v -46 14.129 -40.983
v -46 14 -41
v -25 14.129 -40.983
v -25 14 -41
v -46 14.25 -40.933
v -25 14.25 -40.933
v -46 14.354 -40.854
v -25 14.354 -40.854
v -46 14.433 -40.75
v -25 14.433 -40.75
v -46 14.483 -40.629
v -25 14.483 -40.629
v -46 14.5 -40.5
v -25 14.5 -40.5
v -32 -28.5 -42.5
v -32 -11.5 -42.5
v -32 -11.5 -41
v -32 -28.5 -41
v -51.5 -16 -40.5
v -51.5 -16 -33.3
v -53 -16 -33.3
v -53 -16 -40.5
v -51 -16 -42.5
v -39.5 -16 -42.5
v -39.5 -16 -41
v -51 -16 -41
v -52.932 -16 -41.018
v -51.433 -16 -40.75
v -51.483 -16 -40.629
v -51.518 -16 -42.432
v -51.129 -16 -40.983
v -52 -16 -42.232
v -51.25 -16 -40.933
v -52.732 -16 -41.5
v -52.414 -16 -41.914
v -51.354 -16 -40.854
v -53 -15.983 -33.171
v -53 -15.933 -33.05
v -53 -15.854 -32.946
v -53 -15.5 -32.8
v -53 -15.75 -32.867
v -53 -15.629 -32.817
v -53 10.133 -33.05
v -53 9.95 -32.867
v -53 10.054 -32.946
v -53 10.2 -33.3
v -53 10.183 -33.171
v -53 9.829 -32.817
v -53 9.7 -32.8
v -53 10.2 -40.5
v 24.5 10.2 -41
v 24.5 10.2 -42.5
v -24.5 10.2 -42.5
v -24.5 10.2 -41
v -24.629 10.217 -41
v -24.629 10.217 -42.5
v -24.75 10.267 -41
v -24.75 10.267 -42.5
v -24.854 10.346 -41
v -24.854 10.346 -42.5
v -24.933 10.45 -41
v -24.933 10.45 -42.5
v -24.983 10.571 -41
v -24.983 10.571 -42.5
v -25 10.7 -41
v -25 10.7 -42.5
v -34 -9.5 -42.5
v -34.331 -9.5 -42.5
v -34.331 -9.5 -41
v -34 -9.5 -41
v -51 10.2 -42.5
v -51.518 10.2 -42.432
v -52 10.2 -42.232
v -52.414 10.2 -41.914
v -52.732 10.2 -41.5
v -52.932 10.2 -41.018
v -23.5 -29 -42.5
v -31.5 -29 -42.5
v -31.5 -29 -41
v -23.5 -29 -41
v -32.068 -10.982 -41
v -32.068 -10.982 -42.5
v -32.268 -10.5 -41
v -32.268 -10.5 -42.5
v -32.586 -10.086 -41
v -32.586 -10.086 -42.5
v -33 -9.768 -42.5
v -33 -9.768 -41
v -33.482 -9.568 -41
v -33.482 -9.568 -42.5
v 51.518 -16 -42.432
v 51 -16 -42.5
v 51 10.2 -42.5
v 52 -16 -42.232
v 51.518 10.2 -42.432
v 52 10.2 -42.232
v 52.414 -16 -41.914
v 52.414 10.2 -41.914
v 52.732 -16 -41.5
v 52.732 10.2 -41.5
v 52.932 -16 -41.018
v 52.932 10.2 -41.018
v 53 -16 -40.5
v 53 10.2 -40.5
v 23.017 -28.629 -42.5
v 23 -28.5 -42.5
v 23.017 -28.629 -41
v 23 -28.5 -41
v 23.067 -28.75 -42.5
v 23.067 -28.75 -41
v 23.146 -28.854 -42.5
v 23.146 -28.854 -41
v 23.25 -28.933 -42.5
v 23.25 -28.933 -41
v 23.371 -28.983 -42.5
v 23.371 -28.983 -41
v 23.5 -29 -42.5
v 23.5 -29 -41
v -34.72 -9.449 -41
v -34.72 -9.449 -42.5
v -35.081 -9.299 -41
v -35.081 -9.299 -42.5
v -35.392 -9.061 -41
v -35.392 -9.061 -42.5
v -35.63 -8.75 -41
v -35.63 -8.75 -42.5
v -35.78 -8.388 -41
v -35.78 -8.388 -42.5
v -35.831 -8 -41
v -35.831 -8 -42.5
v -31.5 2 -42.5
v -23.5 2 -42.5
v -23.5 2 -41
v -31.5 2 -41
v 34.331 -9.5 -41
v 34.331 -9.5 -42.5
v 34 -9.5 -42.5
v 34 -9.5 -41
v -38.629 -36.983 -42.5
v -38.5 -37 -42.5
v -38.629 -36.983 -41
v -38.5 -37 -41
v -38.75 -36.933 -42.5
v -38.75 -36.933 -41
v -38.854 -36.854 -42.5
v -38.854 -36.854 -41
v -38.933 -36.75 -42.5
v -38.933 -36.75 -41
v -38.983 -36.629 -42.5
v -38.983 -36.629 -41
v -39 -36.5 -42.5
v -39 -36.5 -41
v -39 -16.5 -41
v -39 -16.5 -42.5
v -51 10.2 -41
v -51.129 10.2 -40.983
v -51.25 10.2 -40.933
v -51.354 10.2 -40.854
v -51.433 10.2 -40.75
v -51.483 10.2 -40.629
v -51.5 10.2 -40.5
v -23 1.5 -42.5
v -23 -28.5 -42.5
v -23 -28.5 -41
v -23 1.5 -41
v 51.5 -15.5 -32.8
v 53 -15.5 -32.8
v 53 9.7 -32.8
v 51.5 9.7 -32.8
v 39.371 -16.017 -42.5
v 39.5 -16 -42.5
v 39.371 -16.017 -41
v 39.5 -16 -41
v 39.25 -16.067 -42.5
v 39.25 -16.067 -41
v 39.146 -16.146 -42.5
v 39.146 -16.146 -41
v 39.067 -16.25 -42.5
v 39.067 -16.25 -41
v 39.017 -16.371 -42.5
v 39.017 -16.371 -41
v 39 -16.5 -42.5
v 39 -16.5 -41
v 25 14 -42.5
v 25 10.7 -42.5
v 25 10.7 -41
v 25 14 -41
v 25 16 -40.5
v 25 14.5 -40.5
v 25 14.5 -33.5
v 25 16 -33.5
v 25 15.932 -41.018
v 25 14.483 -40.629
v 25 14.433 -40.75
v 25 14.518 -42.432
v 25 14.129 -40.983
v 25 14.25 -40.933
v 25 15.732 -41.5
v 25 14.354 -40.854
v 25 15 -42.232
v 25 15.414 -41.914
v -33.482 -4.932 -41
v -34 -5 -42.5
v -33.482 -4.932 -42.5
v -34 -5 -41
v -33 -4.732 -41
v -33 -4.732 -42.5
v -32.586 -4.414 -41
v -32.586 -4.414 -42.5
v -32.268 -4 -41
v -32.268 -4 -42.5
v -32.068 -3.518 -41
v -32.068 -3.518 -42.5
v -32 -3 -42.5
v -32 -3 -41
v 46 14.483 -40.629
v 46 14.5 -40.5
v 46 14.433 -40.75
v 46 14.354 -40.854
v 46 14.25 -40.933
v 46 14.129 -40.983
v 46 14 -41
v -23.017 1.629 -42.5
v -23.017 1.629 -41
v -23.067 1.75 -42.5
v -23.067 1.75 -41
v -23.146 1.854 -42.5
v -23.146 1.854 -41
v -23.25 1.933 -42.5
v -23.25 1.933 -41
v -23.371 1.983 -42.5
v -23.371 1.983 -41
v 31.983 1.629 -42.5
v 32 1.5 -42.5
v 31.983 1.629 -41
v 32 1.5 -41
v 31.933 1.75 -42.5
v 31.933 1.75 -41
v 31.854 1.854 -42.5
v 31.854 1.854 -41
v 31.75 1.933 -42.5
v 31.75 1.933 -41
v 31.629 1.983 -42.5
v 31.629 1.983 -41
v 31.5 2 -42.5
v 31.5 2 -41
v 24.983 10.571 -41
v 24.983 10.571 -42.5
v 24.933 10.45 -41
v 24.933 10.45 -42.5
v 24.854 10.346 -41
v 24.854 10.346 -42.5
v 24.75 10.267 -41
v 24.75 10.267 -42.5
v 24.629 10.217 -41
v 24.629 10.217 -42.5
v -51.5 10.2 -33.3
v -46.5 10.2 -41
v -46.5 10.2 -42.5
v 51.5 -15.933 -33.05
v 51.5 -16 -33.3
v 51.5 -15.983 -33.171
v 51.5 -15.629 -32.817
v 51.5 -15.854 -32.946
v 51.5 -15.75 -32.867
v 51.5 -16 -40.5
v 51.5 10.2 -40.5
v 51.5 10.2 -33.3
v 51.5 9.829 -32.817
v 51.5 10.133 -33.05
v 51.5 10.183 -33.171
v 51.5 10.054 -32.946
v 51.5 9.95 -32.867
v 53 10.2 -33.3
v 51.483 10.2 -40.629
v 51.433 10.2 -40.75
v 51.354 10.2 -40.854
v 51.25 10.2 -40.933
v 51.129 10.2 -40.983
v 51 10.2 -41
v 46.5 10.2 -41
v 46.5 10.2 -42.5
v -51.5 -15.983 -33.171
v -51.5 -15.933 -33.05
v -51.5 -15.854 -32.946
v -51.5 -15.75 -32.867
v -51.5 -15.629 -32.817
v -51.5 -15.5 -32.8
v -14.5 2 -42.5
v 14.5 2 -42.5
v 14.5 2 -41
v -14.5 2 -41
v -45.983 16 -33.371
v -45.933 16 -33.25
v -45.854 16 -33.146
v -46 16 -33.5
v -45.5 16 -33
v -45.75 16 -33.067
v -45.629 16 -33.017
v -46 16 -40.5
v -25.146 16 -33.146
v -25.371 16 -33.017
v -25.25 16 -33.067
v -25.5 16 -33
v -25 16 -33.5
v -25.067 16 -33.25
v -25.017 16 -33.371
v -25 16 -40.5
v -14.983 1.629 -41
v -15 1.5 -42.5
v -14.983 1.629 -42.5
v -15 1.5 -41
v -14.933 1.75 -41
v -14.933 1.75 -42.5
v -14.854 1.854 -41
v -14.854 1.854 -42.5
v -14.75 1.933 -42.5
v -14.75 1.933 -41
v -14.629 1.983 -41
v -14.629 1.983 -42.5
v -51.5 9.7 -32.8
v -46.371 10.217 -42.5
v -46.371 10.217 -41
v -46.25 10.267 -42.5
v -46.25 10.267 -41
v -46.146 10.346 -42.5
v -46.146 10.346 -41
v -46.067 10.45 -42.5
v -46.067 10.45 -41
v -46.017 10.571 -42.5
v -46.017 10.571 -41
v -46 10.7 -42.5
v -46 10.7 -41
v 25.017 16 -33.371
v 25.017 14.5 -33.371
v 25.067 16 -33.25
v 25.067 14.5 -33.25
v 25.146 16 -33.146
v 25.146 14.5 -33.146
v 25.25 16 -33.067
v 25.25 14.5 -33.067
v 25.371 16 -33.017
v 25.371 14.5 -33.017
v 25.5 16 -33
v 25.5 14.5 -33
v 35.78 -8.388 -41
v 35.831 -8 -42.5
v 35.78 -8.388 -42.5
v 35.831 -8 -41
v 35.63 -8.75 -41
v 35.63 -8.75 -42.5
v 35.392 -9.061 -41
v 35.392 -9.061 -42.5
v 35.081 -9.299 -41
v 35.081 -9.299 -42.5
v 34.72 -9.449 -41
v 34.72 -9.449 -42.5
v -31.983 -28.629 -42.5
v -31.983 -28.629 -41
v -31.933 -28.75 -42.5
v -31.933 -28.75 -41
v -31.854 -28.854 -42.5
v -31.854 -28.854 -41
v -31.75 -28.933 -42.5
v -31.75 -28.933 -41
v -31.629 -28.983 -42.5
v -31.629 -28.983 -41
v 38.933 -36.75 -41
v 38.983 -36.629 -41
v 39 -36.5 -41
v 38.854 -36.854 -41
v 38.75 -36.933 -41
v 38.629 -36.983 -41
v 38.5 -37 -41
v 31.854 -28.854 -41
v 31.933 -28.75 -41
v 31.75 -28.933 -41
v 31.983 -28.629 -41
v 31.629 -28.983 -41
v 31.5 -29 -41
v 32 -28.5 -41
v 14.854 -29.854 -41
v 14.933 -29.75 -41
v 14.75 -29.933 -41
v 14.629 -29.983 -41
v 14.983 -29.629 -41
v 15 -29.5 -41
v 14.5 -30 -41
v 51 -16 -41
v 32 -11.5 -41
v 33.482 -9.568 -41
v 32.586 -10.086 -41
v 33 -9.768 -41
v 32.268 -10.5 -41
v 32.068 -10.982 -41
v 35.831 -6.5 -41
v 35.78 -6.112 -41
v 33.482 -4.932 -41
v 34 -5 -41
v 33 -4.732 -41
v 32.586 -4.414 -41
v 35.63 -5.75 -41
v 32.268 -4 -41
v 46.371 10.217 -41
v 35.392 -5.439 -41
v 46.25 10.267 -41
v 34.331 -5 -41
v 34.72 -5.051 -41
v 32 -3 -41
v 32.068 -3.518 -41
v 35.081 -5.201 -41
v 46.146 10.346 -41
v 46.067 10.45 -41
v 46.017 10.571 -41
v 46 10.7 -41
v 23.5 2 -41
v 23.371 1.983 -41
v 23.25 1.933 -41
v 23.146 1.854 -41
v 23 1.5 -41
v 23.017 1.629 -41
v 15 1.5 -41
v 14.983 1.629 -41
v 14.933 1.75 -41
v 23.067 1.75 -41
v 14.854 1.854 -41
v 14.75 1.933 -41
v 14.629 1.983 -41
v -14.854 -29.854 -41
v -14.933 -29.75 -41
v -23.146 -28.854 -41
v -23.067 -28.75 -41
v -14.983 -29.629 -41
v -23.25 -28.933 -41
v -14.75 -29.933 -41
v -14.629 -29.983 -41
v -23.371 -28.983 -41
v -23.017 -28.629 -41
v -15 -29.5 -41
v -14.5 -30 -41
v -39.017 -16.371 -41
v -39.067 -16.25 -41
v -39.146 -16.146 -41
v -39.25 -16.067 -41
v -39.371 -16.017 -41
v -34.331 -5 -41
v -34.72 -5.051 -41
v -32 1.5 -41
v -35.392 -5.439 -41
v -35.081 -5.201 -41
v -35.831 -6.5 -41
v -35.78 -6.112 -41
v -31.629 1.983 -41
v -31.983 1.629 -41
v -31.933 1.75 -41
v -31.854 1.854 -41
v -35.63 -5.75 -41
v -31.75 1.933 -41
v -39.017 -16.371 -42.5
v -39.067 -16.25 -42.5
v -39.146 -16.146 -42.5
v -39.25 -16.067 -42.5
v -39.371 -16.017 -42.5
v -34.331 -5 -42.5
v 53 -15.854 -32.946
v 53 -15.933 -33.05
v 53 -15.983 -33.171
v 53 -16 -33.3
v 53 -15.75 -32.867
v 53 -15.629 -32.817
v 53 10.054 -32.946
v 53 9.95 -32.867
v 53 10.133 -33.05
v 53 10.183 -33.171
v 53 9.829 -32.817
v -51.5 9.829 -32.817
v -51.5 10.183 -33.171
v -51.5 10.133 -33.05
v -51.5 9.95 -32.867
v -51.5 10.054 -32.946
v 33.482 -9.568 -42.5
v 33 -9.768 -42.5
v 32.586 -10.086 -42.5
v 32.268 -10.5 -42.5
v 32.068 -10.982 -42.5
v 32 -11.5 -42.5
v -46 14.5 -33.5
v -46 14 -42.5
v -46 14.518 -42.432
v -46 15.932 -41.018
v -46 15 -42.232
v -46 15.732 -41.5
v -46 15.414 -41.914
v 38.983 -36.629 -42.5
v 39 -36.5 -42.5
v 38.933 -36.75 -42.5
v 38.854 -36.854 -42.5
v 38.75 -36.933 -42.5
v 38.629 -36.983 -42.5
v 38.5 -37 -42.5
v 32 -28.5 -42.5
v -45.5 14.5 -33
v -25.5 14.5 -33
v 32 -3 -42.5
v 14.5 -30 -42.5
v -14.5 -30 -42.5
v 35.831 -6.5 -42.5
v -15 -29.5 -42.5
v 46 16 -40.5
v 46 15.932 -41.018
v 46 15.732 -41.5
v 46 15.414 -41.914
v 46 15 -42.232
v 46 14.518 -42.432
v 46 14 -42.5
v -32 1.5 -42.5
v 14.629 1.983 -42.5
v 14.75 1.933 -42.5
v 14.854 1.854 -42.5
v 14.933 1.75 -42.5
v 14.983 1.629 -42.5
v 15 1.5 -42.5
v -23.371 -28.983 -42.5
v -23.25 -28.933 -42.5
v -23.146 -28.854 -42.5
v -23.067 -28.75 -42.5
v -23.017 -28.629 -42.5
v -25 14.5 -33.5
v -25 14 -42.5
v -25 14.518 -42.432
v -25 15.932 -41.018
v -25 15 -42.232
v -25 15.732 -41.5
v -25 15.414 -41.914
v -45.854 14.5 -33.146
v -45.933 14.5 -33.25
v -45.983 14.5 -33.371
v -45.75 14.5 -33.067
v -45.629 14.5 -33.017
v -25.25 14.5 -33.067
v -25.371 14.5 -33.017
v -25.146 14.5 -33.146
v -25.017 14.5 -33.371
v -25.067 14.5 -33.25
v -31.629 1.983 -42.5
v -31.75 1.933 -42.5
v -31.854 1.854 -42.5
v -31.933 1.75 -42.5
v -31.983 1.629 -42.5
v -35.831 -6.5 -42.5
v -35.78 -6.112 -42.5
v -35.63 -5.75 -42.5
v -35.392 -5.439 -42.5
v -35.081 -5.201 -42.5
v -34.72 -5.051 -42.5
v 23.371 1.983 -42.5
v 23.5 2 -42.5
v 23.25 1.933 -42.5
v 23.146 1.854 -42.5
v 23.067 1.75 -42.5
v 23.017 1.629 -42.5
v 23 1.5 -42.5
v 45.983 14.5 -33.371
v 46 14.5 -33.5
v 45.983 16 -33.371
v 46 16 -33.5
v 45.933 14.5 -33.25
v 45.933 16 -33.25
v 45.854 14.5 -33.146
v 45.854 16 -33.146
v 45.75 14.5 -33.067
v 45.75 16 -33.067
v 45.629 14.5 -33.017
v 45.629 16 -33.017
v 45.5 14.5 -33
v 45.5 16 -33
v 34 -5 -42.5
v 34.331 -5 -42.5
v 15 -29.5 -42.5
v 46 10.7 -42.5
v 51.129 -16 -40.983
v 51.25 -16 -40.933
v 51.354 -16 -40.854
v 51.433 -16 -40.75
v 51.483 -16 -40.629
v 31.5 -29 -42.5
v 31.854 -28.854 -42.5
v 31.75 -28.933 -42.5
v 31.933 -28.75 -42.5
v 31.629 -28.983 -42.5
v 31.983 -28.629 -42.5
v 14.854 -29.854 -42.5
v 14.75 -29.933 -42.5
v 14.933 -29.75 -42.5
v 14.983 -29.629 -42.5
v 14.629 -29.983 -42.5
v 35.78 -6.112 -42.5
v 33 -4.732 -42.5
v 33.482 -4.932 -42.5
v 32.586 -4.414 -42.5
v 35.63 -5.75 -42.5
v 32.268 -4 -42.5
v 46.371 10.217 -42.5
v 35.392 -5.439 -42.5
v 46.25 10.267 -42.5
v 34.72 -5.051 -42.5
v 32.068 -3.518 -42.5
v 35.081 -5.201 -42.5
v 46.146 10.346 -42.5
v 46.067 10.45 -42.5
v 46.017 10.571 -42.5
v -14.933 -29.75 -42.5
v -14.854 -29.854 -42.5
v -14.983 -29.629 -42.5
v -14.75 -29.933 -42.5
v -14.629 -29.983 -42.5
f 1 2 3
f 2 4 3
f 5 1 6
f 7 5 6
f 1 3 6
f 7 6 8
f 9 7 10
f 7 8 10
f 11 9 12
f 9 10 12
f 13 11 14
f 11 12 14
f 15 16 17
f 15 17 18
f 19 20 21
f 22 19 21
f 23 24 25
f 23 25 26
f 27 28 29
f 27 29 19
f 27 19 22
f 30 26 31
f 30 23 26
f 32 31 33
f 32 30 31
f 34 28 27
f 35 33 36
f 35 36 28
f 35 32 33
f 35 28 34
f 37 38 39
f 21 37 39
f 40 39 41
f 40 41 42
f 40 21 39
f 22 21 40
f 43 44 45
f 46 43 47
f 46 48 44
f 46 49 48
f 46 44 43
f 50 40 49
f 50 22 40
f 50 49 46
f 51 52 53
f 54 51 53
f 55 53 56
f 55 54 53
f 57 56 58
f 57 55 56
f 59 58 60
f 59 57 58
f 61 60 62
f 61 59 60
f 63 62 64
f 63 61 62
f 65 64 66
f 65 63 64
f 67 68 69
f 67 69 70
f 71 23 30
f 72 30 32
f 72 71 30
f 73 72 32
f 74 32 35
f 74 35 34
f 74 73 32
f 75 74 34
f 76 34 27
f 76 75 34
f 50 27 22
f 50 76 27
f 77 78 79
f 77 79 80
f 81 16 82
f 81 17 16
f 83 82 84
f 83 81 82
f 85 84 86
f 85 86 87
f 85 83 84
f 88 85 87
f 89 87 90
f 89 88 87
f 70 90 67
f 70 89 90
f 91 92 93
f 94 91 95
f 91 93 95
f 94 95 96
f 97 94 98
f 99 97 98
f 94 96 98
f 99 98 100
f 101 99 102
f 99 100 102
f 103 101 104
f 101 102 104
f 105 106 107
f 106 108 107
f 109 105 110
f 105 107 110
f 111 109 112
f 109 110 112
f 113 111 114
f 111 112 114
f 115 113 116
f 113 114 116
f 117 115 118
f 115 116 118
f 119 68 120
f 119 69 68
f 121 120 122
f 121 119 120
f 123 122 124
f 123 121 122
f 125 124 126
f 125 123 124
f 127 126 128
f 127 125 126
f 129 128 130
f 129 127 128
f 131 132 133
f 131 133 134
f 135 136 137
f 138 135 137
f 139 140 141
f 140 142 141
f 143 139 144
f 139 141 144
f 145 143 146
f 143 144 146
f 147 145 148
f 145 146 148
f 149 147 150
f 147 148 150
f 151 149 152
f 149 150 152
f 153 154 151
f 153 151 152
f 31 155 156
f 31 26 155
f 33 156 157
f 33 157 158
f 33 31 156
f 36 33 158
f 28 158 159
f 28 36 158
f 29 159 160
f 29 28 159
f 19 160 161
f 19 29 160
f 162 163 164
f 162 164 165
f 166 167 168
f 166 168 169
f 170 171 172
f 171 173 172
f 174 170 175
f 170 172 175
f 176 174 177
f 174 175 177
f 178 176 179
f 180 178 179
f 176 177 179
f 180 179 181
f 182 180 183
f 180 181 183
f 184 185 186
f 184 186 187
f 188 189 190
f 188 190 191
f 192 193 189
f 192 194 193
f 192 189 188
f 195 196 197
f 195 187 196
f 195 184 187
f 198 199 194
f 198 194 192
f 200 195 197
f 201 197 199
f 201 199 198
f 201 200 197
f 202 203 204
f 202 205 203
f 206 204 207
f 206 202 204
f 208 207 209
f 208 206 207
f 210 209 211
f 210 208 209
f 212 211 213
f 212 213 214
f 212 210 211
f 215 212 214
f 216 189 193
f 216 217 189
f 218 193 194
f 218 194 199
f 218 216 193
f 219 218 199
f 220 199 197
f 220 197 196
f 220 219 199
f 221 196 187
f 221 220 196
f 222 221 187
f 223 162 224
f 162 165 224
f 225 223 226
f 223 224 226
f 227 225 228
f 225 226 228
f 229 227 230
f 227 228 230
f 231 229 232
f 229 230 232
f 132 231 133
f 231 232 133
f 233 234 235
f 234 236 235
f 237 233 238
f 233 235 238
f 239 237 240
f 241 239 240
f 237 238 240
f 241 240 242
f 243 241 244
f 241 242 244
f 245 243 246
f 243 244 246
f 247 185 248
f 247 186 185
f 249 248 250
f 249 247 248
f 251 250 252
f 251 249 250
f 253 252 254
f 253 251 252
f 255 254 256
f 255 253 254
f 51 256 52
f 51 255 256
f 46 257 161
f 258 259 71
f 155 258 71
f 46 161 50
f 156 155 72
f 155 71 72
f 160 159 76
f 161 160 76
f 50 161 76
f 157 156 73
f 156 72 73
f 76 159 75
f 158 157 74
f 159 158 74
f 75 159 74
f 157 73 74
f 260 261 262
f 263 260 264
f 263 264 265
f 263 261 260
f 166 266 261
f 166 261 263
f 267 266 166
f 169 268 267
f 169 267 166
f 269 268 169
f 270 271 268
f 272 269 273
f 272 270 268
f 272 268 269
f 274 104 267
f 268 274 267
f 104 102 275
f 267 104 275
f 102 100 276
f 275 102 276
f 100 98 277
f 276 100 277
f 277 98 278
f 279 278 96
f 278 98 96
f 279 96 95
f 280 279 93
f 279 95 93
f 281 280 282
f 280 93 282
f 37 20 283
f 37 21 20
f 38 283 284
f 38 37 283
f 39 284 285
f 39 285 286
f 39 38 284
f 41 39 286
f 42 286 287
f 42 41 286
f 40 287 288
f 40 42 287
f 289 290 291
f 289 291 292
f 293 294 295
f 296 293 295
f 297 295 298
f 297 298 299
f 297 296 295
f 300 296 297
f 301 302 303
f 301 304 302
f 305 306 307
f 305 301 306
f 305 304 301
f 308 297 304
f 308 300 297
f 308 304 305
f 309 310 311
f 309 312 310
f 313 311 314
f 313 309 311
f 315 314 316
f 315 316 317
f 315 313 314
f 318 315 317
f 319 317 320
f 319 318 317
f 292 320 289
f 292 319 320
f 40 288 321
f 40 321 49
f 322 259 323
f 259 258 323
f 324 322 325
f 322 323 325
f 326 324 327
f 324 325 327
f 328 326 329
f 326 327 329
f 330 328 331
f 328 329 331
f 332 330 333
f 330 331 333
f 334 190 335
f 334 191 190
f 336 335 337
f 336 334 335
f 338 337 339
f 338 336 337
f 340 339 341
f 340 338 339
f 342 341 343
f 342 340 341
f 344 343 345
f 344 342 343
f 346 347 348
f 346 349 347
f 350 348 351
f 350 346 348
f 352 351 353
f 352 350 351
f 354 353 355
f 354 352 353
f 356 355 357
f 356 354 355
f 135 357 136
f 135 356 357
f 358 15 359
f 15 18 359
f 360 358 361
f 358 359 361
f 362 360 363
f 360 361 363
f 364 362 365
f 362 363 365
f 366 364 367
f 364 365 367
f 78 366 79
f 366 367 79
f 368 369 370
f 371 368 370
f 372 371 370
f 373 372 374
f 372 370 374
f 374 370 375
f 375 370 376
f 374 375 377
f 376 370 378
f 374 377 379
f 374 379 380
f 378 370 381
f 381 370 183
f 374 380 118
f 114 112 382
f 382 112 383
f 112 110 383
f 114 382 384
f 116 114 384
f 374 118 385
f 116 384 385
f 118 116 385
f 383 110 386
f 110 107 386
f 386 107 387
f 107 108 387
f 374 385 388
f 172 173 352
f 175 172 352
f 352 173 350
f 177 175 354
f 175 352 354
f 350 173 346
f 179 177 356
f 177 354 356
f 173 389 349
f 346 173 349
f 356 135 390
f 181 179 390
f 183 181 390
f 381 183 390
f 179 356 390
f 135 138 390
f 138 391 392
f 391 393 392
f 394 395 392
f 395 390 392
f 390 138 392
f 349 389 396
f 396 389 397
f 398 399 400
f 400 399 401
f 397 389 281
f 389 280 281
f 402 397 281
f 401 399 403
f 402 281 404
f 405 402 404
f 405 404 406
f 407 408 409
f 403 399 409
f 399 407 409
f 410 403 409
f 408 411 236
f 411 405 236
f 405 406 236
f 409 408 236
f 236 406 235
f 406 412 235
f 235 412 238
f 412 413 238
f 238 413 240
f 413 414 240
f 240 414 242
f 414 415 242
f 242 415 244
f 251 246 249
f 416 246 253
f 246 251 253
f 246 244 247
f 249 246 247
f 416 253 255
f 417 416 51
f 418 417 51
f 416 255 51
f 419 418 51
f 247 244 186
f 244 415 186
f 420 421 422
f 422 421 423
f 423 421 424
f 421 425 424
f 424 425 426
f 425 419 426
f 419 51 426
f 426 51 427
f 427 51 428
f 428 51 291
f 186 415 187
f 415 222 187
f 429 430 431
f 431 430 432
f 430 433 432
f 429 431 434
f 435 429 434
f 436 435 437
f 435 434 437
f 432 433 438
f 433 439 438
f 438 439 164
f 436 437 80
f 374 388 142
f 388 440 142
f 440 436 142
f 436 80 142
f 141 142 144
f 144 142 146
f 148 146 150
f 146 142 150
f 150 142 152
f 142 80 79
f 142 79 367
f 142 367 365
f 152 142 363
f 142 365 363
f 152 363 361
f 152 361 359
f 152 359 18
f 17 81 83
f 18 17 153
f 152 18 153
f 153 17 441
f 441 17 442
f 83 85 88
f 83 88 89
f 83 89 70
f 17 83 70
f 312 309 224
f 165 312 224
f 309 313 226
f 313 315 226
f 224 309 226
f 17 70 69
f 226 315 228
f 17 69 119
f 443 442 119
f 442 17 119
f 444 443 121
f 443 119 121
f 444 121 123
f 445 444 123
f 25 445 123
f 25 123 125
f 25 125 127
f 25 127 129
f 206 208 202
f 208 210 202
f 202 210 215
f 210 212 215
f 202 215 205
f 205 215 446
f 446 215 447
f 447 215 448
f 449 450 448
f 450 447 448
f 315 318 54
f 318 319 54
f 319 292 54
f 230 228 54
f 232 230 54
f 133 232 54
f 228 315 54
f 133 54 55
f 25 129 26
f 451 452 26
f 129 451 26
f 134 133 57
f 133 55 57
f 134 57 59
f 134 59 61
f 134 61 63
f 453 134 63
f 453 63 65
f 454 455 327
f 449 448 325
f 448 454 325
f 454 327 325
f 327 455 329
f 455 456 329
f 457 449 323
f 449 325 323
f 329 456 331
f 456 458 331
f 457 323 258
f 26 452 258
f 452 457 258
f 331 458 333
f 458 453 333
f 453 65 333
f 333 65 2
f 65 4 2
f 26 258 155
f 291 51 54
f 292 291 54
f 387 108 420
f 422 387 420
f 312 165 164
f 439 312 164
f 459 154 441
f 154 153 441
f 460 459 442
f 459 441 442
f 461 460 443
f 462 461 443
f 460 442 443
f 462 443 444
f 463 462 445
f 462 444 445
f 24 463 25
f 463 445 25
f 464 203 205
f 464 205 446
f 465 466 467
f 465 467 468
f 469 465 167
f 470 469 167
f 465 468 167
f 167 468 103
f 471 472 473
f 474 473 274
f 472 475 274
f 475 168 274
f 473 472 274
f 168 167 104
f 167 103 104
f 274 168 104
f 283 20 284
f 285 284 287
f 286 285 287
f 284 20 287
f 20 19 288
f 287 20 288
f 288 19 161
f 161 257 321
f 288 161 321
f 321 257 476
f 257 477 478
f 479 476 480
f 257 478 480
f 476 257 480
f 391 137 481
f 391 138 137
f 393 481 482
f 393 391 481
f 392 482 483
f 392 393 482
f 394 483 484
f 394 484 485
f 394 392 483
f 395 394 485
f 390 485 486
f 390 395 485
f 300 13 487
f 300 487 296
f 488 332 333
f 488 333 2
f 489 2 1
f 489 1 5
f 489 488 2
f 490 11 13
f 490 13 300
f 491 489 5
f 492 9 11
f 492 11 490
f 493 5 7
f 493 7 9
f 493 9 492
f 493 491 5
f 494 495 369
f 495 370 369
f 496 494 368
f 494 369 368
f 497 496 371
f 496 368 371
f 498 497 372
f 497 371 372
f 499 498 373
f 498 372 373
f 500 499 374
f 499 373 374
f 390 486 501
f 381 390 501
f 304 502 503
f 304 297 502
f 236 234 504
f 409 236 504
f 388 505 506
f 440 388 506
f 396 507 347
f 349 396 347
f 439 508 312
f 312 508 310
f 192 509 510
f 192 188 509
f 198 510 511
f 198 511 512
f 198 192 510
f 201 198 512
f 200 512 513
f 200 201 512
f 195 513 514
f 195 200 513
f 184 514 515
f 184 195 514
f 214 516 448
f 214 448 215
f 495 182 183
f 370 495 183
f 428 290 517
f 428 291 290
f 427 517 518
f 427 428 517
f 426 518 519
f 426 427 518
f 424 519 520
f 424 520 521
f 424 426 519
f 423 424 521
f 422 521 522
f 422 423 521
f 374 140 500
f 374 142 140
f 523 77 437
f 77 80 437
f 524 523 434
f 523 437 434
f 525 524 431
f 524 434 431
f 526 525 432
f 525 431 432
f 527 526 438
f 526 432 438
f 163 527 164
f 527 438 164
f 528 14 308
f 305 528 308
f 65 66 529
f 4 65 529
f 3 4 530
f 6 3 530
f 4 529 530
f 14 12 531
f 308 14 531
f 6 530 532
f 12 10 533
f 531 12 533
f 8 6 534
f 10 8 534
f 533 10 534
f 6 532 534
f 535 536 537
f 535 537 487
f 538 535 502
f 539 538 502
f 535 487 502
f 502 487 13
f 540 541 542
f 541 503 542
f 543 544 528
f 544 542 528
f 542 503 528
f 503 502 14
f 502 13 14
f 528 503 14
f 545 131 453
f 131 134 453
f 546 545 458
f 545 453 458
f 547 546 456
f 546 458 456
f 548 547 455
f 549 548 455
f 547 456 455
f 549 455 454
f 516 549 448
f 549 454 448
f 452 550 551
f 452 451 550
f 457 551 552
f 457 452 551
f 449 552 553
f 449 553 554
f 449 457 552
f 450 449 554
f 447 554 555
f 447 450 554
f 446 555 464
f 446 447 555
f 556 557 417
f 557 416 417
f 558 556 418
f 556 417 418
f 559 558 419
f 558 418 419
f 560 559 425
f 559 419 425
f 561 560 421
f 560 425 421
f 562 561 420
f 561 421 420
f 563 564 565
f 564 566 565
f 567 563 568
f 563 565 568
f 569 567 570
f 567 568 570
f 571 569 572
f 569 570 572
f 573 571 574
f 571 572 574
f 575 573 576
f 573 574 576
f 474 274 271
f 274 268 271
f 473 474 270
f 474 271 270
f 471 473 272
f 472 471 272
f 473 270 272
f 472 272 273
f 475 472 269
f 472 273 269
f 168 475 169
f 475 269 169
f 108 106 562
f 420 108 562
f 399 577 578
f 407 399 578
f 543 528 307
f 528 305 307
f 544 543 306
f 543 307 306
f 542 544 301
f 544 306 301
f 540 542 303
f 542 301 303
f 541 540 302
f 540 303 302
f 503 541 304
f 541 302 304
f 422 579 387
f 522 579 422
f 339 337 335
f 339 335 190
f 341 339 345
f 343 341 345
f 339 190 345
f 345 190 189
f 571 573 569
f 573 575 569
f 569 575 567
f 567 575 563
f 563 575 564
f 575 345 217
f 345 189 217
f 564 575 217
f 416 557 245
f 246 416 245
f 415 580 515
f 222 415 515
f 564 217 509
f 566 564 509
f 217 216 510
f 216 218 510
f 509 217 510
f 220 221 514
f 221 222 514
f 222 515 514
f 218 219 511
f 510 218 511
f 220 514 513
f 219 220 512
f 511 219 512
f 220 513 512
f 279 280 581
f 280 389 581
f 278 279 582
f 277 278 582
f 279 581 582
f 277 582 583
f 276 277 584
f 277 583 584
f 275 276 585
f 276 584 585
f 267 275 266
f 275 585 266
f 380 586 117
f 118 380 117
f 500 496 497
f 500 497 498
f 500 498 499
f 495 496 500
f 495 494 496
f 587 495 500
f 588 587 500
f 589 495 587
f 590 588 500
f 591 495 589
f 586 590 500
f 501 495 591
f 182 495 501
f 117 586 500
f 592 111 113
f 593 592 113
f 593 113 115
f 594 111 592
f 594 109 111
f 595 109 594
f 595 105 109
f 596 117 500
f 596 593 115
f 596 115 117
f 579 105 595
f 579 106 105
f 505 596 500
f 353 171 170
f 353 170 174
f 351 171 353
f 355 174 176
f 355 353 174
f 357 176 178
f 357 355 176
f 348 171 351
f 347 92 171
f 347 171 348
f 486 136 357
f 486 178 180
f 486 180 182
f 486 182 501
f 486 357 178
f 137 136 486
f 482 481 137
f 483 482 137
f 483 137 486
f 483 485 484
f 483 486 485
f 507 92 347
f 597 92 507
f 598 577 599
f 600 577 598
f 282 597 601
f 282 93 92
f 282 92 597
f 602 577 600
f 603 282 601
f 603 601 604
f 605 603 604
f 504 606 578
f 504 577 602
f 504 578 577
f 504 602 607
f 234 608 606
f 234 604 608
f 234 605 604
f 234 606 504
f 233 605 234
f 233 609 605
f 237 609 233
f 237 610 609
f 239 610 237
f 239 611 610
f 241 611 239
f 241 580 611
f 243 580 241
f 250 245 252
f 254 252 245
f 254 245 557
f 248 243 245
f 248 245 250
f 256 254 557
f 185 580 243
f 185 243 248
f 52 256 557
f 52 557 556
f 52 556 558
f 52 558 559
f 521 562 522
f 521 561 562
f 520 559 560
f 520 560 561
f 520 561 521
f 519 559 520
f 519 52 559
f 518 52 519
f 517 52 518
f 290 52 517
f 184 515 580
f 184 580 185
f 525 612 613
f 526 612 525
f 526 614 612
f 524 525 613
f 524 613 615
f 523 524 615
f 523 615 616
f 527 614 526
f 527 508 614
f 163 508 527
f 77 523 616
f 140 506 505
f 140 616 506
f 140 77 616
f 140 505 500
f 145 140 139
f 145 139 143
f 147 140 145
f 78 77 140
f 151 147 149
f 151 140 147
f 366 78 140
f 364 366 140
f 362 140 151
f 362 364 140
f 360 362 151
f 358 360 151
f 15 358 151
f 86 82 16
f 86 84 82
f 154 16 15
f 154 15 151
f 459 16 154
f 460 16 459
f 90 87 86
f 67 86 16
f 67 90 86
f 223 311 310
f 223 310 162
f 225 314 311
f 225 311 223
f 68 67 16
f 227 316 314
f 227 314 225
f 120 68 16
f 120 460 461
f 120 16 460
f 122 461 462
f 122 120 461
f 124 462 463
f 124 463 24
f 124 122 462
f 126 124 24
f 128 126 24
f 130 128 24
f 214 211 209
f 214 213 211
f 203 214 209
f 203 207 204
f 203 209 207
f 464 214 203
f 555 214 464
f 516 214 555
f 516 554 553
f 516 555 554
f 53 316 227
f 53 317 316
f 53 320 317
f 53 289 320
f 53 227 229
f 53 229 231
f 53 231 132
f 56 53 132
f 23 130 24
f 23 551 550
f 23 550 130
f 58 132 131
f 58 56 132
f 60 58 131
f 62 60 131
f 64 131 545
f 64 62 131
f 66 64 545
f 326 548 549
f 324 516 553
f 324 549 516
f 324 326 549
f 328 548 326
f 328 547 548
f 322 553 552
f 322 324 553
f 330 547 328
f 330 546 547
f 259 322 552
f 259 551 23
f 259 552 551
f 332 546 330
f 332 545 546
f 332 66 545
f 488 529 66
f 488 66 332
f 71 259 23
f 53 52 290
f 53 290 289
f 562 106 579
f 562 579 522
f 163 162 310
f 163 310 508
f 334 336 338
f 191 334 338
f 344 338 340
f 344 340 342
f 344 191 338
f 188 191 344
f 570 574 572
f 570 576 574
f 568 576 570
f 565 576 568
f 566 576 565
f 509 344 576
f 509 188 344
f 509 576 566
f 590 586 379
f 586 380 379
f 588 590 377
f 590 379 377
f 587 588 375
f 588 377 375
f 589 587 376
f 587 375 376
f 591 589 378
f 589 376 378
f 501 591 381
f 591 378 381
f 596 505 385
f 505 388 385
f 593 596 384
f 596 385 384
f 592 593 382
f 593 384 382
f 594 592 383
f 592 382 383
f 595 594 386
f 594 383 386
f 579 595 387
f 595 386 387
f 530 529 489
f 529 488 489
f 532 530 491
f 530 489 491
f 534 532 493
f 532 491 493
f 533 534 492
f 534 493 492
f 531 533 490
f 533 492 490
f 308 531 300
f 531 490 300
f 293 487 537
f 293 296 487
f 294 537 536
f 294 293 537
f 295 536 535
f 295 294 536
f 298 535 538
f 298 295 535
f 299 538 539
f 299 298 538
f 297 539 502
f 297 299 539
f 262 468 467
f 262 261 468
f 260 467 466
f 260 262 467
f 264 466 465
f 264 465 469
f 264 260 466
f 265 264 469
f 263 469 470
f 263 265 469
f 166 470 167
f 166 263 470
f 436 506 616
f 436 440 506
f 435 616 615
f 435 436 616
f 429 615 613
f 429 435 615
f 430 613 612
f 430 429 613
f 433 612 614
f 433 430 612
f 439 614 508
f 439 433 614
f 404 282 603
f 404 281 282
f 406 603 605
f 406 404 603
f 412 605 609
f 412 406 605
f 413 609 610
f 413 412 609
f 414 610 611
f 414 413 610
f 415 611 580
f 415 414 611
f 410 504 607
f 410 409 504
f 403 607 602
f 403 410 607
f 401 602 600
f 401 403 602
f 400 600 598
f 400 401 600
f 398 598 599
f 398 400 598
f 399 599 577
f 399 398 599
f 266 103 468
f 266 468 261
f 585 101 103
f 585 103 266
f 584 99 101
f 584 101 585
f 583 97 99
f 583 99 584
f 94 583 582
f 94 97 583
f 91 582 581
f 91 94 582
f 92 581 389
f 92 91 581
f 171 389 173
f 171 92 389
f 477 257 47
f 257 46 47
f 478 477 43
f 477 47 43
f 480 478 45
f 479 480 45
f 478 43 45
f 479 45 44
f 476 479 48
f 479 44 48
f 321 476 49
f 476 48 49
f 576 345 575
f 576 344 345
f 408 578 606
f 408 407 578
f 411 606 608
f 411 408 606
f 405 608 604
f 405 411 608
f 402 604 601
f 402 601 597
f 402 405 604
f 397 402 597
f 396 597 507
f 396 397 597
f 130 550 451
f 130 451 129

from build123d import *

# Parameters (mm, degrees)
SKETCH1_W           = 106
SKETCH1_H           = 26.2
BOSS_EXTRUDE1_DEPTH = 9.7
SKETCH2_W           = 103
SKETCH2_H           = 8.2
CUT_EXTRUDE1_DEPTH  = 27.2
SKETCH3_W           = 21
SKETCH3_H           = 1.5
BOSS_EXTRUDE2_DEPTH = 5.8
SKETCH4_W           = 21
SKETCH4_H           = 1.5
BOSS_EXTRUDE3_DEPTH = 8
SKETCH5_W           = 21
SKETCH5_H           = 1.5
BOSS_EXTRUDE4_DEPTH = 5.8
SKETCH6_W           = 21
SKETCH6_H           = 1.5
BOSS_EXTRUDE5_DEPTH = 8
SKETCH7_W           = 78
SKETCH7_H           = 1.5
BOSS_EXTRUDE6_DEPTH = 21
FILLET1_R           = 0.5
FILLET2_R           = 2
SKETCH8_W           = 30
SKETCH8_H           = 32
CUT_EXTRUDE2_DEPTH  = 1.5
FILLET4_R           = 2
FILLET5_R           = 1.5
FILLET6_R           = 0.5
FILLET7_R           = 0.5


with BuildPart() as part:
    # Sketch1 → Boss-Extrude1 (new body)
    with BuildSketch(Plane(origin=(0, 0, -42.5), x_dir=(-1, 0, 0), z_dir=(0, 0, -1))):
        with Locations((0, -2.9)):
            Rectangle(SKETCH1_W, SKETCH1_H)
    extrude(amount=-BOSS_EXTRUDE1_DEPTH)

    # Sketch2 → Cut-Extrude1 (cut, through all)
    with BuildSketch(Plane(origin=(0, 10.2, 0), x_dir=(-1, 0, 0), z_dir=(0, 1, 0))):
        with Locations((0, -36.9)):
            Rectangle(SKETCH2_W, SKETCH2_H)
    extrude(amount=-CUT_EXTRUDE1_DEPTH, mode=Mode.SUBTRACT)

    # Sketch3 → Boss-Extrude2 (add)
    with BuildSketch(Plane(origin=(0, 10.2, 0), x_dir=(-1, 0, 0), z_dir=(0, 1, 0))):
        with Locations((35.5, -41.75)):
            Rectangle(SKETCH3_W, SKETCH3_H)
    extrude(amount=BOSS_EXTRUDE2_DEPTH)

    # Sketch4 → Boss-Extrude3 (add)
    with BuildSketch(Plane.XY.offset(-41)):
        with Locations((-35.5, 15.25)):
            Rectangle(SKETCH4_W, SKETCH4_H)
    extrude(amount=BOSS_EXTRUDE3_DEPTH)

    # Sketch5 → Boss-Extrude4 (add)
    with BuildSketch(Plane(origin=(0, 10.2, 0), x_dir=(-1, 0, 0), z_dir=(0, 1, 0))):
        with Locations((-35.5, -41.75)):
            Rectangle(SKETCH5_W, SKETCH5_H)
    extrude(amount=BOSS_EXTRUDE4_DEPTH)

    # Sketch6 → Boss-Extrude5 (add)
    with BuildSketch(Plane.XY.offset(-41)):
        with Locations((35.5, 15.25)):
            Rectangle(SKETCH6_W, SKETCH6_H)
    extrude(amount=BOSS_EXTRUDE5_DEPTH)

    # Sketch7 → Boss-Extrude6 (add)
    with BuildSketch(Plane.XZ.offset(16)):
        with Locations((0, -41.75)):
            Rectangle(SKETCH7_W, SKETCH7_H)
    extrude(amount=BOSS_EXTRUDE6_DEPTH)

    # Fillet1
    fillet1_edges = [part.edges().sort_by_distance(p)[0] for p in [
        (-51.5, -2.9, -41),
        (51.5, -2.9, -41),
        (-35.5, 14.5, -41),
        (35.5, 14.5, -41),
    ]]
    fillet(fillet1_edges, radius=FILLET1_R)

    # Fillet2
    fillet2_edges = [part.edges().sort_by_distance(p)[0] for p in [
        (-35.5, 16, -42.5),
        (53, -2.9, -42.5),
        (-53, -2.9, -42.5),
        (35.5, 16, -42.5),
    ]]
    fillet(fillet2_edges, radius=FILLET2_R)

    # Sketch8 → Cut-Extrude2 (cut)
    with BuildSketch(Plane(origin=(0, 0, -42.5), x_dir=(-1, 0, 0), z_dir=(0, 0, -1))):
        with Locations((0, -14)):
            Rectangle(SKETCH8_W, SKETCH8_H)
        Polygon((-23, 2), (-32, 2), (-32, -5), (-35.831359268, -5), (-35.831359268, -9.5), (-32, -9.5), (-32, -29), (-23, -29), align=None)
        Polygon((32, -29), (23, -29), (23, 2), (32, 2), (32, -5), (35.831359268, -5), (35.831359268, -9.5), (32, -9.5), align=None)
    extrude(amount=-CUT_EXTRUDE2_DEPTH, mode=Mode.SUBTRACT)

    # Fillet4
    fillet4_edges = [part.edges().sort_by_distance(p)[0] for p in [
        (32, -9.5, -41.75),
        (32, -5, -41.75),
        (-32, -9.5, -41.75),
        (-32, -5, -41.75),
    ]]
    fillet(fillet4_edges, radius=FILLET4_R)

    # Fillet5
    fillet5_edges = [part.edges().sort_by_distance(p)[0] for p in [
        (35.831359268, -9.5, -41.75),
        (35.831359268, -5, -41.75),
        (-35.831359268, -5, -41.75),
        (-35.831359268, -9.5, -41.75),
    ]]
    fillet(fillet5_edges, radius=FILLET5_R)

    # Fillet6
    fillet6_edges = [part.edges().sort_by_distance(p)[0] for p in [
        (15, -30, -41.75),
        (15, 2, -41.75),
        (-15, 2, -41.75),
        (-15, -30, -41.75),
        (23, 2, -41.75),
        (23, -29, -41.75),
        (32, -29, -41.75),
        (32, 2, -41.75),
        (-32, -29, -41.75),
        (-23, -29, -41.75),
        (-23, 2, -41.75),
        (-32, 2, -41.75),
    ]]
    fillet(fillet6_edges, radius=FILLET6_R)

    # Fillet7
    fillet7_edges = [part.edges().sort_by_distance(p)[0] for p in [
        (52.25, -16, -32.8),
        (-52.25, -16, -32.8),
        (52.25, 10.2, -32.8),
        (-25, 10.2, -41.75),
        (-46, 10.2, -41.75),
        (-46, 15.25, -33),
        (-25, 15.25, -33),
        (46, 10.2, -41.75),
        (25, 10.2, -41.75),
        (-52.25, 10.2, -32.8),
        (46, 15.25, -33),
        (25, 15.25, -33),
        (-39, -16, -41.75),
        (39, -16, -41.75),
        (-39, -37, -41.75),
        (39, -37, -41.75),
    ]]
    fillet(fillet7_edges, radius=FILLET7_R)


solid = part.part
